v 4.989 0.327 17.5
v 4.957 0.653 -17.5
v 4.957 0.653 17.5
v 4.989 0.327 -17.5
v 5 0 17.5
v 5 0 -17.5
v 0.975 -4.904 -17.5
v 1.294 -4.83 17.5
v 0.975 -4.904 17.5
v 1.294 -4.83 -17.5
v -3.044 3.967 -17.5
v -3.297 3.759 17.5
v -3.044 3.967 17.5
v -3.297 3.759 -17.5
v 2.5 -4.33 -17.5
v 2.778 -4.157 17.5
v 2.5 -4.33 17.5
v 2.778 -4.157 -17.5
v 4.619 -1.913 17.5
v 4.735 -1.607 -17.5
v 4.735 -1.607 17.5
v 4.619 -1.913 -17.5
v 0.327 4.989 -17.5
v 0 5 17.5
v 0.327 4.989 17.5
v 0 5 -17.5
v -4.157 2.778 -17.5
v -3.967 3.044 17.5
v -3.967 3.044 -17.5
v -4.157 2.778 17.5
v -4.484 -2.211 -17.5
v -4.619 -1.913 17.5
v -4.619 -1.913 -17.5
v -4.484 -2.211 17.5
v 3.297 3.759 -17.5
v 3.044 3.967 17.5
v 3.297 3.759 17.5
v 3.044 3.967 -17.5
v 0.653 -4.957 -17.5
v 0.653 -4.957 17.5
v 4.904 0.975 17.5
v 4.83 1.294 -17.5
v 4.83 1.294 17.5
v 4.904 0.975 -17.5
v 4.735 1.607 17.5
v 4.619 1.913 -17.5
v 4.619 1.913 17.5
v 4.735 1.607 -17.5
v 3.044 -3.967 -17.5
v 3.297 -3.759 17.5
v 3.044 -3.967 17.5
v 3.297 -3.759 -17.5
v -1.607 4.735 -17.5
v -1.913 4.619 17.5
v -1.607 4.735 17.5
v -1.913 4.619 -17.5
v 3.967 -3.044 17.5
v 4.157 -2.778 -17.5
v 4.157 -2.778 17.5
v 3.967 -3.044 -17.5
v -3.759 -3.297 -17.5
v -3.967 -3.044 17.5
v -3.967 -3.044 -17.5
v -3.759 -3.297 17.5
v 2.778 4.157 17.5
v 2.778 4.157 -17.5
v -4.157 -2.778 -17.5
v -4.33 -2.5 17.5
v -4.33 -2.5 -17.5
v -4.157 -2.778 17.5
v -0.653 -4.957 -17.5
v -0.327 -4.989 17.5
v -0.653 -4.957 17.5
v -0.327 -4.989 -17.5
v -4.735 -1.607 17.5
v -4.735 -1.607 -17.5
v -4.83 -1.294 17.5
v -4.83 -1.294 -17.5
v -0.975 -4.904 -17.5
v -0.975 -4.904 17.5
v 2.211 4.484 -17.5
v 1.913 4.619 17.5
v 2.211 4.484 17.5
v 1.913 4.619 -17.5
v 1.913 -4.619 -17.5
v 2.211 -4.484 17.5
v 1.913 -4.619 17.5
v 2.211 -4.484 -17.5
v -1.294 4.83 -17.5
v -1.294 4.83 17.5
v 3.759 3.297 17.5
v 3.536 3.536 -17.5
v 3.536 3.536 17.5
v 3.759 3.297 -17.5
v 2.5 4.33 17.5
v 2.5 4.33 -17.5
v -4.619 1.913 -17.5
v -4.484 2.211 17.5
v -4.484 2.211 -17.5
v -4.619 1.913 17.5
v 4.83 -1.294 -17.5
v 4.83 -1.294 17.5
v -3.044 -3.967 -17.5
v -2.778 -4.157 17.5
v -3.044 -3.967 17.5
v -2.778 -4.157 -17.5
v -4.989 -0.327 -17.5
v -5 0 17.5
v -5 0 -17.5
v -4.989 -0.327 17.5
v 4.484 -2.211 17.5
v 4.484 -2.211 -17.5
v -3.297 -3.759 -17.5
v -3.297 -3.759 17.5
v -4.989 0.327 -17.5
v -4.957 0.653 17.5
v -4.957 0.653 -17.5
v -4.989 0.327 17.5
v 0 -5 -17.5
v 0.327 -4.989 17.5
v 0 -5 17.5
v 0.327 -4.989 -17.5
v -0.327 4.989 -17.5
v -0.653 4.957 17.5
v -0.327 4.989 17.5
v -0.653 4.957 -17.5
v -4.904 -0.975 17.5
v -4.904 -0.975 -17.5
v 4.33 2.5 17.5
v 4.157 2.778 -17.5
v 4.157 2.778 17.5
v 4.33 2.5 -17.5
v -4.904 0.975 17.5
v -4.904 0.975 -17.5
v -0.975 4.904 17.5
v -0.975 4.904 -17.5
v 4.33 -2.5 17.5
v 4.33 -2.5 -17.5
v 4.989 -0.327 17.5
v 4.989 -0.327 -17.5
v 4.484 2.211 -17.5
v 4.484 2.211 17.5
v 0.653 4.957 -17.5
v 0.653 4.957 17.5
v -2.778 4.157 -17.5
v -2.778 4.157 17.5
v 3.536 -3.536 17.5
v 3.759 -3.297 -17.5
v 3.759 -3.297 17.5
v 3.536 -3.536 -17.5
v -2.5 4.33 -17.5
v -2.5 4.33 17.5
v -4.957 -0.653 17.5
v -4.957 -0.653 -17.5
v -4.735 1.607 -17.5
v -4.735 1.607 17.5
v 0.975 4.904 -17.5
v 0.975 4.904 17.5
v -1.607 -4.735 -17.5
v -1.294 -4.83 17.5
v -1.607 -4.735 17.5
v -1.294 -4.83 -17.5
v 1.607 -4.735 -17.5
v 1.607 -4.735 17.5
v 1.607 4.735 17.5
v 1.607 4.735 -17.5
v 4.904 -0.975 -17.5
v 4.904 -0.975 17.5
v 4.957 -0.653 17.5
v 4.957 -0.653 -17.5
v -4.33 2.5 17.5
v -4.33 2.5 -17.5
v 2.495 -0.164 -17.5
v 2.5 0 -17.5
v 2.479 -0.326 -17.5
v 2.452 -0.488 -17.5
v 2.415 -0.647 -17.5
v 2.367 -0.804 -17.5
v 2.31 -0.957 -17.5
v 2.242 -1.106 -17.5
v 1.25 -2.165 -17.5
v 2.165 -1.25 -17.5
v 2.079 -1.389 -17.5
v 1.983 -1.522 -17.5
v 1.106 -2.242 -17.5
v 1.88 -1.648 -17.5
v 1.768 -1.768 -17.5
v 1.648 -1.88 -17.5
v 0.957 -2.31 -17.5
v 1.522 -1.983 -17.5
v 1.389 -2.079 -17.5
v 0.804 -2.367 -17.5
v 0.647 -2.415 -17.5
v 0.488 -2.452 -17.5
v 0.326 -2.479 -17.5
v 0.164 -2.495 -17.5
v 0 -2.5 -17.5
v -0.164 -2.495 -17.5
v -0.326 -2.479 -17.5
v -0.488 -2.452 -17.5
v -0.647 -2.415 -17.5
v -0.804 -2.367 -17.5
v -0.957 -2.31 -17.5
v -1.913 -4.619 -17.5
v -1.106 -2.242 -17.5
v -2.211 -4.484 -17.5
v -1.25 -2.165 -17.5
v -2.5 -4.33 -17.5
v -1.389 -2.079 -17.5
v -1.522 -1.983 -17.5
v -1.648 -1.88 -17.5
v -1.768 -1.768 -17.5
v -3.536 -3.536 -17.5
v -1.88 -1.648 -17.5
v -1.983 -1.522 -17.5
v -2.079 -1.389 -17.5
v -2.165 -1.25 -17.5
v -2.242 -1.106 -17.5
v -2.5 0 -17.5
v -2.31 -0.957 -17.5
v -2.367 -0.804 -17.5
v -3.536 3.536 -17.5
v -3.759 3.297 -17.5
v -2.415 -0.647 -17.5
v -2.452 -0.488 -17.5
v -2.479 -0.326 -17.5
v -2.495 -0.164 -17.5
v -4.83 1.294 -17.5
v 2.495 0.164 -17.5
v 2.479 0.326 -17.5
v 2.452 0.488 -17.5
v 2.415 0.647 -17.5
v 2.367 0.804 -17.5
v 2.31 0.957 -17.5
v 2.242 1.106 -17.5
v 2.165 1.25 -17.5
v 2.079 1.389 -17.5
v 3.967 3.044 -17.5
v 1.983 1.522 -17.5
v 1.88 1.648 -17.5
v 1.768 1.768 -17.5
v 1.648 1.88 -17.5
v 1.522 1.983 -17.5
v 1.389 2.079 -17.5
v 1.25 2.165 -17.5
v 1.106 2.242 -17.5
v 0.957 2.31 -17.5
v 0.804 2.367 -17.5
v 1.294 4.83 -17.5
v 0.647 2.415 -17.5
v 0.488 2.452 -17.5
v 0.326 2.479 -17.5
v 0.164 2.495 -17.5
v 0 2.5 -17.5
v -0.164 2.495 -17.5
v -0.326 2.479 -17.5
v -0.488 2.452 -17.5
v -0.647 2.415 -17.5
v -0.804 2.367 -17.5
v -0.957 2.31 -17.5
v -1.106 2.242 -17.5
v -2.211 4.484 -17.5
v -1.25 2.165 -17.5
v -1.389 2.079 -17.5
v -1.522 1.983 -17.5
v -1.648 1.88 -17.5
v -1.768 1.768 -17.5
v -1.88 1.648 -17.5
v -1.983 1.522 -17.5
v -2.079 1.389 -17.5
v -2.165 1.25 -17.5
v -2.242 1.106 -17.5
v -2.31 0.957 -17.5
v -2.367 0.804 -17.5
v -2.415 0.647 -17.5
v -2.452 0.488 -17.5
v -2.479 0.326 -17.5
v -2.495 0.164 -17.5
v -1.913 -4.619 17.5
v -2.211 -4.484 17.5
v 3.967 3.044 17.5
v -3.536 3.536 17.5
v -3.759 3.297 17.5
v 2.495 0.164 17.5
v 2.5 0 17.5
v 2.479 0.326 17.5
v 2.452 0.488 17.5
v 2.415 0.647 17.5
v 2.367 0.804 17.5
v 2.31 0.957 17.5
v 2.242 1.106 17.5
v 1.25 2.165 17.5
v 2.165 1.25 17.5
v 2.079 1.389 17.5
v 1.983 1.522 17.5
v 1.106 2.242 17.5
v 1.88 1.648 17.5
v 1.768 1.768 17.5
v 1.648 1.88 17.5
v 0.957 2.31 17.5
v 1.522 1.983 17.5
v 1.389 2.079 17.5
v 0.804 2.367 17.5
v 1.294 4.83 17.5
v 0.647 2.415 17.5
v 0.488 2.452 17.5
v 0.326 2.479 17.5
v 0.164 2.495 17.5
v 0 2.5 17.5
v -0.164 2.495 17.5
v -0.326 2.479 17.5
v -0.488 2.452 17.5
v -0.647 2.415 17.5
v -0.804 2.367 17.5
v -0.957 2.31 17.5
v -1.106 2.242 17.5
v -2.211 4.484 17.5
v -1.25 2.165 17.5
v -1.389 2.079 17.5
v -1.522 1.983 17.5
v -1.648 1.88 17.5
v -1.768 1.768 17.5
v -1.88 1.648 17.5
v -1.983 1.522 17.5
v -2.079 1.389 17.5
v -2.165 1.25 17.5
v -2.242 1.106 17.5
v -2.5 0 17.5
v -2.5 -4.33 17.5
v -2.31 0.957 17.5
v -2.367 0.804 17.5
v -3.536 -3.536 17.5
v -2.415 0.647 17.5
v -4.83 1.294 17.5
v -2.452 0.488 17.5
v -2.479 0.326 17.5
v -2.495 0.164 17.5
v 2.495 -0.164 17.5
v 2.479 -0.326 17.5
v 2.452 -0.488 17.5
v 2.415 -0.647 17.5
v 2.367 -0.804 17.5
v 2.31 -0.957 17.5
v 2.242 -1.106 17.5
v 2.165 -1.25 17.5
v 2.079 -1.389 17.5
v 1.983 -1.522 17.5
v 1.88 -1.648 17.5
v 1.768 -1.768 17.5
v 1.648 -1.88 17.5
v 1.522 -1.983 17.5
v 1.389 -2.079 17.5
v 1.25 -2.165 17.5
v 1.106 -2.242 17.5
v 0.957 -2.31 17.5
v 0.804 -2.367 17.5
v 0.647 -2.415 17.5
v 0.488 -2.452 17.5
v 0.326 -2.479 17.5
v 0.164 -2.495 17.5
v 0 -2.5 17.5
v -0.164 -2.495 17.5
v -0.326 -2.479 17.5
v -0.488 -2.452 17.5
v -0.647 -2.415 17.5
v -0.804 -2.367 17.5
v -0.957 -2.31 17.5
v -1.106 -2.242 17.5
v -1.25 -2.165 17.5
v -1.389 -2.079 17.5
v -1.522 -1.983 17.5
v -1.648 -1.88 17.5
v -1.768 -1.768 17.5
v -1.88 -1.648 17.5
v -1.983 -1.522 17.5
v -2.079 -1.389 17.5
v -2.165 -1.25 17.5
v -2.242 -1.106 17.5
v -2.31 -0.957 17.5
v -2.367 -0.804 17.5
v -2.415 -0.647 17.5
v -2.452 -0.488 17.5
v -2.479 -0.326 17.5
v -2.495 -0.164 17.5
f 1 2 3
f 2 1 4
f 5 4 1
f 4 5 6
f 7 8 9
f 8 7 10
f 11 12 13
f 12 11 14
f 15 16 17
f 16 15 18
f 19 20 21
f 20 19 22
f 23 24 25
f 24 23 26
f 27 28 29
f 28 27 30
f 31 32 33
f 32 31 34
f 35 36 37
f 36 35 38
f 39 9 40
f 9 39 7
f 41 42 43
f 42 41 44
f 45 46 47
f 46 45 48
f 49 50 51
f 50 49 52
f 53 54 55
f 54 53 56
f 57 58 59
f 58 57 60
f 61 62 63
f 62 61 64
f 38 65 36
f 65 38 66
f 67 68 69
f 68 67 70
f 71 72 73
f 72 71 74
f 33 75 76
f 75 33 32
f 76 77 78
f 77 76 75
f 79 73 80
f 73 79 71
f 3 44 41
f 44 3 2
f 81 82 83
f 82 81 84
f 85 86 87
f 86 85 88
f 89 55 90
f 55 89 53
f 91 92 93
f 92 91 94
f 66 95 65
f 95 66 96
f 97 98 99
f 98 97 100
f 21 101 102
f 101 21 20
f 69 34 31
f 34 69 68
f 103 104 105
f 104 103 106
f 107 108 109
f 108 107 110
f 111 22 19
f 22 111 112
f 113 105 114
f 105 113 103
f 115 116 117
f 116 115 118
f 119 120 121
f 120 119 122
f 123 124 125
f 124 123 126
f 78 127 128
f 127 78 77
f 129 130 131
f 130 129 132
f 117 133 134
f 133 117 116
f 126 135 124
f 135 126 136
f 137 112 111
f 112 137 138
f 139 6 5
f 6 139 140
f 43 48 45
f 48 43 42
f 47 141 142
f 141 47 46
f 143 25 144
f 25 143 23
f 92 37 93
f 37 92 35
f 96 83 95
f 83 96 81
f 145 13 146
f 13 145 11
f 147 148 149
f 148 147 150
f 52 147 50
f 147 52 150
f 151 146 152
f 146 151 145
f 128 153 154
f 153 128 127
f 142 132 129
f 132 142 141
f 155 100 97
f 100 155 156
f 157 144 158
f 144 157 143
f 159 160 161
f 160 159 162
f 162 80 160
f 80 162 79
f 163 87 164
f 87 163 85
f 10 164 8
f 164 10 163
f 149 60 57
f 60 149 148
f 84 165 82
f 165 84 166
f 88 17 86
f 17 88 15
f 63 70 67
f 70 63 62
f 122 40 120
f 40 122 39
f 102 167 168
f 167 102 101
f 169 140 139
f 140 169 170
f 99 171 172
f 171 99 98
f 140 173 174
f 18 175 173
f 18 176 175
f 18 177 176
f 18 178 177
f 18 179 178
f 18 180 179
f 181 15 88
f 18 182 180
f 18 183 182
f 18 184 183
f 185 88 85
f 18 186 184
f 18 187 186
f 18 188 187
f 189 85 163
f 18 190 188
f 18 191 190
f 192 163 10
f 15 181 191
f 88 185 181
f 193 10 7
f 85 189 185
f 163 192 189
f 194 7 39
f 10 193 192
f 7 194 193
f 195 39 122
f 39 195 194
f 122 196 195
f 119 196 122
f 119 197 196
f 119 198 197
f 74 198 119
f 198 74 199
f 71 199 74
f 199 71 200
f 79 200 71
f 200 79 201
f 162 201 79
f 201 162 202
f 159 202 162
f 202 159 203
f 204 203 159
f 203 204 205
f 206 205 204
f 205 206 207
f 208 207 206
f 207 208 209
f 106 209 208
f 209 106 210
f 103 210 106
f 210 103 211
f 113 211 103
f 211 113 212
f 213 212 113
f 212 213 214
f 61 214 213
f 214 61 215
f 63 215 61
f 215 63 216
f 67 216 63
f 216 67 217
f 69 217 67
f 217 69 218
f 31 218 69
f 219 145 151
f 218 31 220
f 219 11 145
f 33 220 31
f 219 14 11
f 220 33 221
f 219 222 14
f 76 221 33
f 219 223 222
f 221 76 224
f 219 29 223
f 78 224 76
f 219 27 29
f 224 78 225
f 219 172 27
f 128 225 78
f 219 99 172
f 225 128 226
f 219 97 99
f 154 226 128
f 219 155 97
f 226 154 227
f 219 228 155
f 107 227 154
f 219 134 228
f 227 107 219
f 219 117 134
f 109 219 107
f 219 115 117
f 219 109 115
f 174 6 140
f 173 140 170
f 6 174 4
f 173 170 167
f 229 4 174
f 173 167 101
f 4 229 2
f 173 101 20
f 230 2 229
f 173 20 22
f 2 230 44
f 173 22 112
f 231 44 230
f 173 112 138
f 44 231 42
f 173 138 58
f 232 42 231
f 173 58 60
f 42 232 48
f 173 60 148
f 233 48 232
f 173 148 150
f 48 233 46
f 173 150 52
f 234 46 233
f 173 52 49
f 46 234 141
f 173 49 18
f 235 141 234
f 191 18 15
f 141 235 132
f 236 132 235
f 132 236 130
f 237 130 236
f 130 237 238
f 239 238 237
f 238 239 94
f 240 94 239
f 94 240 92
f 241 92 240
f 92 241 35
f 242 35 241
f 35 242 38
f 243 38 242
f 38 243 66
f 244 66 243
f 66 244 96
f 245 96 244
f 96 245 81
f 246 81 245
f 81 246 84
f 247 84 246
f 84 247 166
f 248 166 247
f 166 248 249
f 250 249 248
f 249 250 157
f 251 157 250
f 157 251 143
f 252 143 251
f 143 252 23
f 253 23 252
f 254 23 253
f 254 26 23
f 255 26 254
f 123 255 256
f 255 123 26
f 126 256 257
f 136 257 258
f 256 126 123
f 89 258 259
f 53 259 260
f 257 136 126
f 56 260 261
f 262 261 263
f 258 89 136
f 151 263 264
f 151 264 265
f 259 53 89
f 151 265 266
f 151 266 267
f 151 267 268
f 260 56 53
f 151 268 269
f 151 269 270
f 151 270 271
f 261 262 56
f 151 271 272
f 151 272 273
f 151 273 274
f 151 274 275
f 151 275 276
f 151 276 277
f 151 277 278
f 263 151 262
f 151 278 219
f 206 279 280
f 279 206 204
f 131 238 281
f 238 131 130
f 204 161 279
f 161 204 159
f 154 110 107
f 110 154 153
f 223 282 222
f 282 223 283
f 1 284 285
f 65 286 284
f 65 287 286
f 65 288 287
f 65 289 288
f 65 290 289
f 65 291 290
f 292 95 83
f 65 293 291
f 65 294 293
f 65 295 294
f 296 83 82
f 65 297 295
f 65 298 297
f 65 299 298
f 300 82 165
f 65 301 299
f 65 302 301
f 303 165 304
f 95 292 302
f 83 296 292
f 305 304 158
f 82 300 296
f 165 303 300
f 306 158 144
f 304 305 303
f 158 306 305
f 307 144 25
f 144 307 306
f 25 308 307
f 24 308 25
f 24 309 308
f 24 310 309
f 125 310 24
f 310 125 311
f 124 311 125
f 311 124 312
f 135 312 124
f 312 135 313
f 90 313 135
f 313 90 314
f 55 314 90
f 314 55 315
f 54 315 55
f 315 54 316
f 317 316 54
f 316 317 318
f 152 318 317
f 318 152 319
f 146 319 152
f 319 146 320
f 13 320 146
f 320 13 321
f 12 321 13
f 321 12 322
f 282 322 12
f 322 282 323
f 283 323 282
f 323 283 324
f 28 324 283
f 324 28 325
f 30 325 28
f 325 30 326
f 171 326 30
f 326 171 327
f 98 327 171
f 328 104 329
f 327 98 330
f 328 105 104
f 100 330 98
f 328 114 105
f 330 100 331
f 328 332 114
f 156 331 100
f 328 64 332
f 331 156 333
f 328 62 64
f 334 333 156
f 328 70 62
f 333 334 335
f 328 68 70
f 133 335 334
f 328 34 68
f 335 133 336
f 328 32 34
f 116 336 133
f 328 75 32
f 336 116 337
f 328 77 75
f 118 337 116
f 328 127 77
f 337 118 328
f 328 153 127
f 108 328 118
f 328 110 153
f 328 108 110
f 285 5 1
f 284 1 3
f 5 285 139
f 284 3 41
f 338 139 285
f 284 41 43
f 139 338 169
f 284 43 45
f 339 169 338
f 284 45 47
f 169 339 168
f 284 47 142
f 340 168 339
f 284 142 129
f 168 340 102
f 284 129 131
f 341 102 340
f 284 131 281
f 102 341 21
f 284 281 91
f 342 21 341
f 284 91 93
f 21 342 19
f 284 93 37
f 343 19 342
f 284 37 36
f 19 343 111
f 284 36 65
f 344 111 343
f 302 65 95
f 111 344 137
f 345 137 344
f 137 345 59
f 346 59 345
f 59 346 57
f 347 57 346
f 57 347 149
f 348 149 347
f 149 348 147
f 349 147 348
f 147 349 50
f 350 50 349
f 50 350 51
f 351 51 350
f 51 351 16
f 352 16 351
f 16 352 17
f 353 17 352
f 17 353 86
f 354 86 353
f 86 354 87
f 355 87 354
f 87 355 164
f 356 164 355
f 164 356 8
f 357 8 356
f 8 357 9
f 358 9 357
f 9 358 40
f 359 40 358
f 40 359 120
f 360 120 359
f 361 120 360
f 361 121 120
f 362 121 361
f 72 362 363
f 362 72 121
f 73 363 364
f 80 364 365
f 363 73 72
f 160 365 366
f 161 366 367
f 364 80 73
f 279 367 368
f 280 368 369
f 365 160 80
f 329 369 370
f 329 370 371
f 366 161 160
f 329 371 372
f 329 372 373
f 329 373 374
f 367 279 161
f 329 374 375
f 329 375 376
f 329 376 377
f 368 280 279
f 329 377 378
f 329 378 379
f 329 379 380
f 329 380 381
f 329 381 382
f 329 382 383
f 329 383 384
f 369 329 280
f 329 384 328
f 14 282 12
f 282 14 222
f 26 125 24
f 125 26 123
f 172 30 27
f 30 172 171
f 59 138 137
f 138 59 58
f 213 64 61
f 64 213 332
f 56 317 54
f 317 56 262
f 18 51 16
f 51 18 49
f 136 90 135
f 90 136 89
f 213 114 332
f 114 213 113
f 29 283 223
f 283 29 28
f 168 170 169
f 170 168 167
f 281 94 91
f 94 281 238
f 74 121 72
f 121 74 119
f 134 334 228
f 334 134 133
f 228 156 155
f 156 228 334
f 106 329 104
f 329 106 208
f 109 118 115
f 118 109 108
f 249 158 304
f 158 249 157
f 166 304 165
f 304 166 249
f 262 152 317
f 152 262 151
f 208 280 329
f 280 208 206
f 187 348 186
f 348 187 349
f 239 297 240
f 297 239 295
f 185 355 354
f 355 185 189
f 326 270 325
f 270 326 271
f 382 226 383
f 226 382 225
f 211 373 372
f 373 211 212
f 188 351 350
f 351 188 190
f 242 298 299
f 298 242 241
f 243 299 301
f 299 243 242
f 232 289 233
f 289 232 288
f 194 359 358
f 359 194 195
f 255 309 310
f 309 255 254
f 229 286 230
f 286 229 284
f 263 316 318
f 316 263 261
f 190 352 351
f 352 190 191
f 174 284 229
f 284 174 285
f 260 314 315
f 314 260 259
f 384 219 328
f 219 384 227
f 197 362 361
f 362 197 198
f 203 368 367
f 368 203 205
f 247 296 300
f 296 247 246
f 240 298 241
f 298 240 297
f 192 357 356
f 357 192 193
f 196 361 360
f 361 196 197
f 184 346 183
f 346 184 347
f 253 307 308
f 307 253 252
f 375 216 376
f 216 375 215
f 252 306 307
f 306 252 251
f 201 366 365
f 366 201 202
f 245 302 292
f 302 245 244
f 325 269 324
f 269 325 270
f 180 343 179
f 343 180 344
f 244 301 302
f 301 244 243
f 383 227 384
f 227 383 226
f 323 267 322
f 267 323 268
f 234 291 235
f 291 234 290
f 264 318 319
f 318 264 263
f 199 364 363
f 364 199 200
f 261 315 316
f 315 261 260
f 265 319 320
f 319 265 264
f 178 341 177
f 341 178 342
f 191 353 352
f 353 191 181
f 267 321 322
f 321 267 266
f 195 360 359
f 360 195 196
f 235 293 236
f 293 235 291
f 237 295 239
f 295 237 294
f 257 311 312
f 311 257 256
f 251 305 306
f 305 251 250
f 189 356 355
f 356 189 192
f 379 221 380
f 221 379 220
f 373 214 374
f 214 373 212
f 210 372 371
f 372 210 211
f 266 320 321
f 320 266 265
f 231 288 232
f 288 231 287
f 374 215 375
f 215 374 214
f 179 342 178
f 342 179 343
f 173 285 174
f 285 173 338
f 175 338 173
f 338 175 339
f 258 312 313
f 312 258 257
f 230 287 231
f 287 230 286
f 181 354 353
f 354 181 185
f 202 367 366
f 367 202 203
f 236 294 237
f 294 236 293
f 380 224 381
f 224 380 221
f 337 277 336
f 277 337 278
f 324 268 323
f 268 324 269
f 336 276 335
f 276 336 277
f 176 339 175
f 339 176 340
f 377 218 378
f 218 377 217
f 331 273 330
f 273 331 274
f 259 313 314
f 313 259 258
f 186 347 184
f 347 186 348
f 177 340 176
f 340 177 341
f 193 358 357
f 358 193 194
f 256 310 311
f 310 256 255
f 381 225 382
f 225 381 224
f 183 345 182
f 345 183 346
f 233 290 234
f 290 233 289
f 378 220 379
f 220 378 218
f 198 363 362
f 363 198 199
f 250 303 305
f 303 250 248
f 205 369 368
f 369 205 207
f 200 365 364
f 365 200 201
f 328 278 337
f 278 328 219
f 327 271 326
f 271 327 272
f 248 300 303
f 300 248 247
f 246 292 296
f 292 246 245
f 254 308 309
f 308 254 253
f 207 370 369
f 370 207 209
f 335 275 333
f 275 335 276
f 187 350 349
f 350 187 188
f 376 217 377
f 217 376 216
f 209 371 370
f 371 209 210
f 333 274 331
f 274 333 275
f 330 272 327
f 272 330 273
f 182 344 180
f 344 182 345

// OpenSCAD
//  Fix X2Y4Z PCB on MDF
// Print 4 pieces
// PRINT VERY SLOW OTHERWISE STILL TO NARROW FOR M4 WHEN PRINTED ONE BY ONE !

DiaM4=5.0; // large enough 
DiaOuter=10; // 10
Height = 35;             
              
   color("lightblue")
   
     
 difference() {  
  
     union()
     {  
  cylinder(h=Height ,d=DiaOuter,center=true,$fn=96); 
   }
         
  cylinder(h=Height+1 ,d= DiaM4,center=true,$fn=96); 
 
   
   
}      

 
